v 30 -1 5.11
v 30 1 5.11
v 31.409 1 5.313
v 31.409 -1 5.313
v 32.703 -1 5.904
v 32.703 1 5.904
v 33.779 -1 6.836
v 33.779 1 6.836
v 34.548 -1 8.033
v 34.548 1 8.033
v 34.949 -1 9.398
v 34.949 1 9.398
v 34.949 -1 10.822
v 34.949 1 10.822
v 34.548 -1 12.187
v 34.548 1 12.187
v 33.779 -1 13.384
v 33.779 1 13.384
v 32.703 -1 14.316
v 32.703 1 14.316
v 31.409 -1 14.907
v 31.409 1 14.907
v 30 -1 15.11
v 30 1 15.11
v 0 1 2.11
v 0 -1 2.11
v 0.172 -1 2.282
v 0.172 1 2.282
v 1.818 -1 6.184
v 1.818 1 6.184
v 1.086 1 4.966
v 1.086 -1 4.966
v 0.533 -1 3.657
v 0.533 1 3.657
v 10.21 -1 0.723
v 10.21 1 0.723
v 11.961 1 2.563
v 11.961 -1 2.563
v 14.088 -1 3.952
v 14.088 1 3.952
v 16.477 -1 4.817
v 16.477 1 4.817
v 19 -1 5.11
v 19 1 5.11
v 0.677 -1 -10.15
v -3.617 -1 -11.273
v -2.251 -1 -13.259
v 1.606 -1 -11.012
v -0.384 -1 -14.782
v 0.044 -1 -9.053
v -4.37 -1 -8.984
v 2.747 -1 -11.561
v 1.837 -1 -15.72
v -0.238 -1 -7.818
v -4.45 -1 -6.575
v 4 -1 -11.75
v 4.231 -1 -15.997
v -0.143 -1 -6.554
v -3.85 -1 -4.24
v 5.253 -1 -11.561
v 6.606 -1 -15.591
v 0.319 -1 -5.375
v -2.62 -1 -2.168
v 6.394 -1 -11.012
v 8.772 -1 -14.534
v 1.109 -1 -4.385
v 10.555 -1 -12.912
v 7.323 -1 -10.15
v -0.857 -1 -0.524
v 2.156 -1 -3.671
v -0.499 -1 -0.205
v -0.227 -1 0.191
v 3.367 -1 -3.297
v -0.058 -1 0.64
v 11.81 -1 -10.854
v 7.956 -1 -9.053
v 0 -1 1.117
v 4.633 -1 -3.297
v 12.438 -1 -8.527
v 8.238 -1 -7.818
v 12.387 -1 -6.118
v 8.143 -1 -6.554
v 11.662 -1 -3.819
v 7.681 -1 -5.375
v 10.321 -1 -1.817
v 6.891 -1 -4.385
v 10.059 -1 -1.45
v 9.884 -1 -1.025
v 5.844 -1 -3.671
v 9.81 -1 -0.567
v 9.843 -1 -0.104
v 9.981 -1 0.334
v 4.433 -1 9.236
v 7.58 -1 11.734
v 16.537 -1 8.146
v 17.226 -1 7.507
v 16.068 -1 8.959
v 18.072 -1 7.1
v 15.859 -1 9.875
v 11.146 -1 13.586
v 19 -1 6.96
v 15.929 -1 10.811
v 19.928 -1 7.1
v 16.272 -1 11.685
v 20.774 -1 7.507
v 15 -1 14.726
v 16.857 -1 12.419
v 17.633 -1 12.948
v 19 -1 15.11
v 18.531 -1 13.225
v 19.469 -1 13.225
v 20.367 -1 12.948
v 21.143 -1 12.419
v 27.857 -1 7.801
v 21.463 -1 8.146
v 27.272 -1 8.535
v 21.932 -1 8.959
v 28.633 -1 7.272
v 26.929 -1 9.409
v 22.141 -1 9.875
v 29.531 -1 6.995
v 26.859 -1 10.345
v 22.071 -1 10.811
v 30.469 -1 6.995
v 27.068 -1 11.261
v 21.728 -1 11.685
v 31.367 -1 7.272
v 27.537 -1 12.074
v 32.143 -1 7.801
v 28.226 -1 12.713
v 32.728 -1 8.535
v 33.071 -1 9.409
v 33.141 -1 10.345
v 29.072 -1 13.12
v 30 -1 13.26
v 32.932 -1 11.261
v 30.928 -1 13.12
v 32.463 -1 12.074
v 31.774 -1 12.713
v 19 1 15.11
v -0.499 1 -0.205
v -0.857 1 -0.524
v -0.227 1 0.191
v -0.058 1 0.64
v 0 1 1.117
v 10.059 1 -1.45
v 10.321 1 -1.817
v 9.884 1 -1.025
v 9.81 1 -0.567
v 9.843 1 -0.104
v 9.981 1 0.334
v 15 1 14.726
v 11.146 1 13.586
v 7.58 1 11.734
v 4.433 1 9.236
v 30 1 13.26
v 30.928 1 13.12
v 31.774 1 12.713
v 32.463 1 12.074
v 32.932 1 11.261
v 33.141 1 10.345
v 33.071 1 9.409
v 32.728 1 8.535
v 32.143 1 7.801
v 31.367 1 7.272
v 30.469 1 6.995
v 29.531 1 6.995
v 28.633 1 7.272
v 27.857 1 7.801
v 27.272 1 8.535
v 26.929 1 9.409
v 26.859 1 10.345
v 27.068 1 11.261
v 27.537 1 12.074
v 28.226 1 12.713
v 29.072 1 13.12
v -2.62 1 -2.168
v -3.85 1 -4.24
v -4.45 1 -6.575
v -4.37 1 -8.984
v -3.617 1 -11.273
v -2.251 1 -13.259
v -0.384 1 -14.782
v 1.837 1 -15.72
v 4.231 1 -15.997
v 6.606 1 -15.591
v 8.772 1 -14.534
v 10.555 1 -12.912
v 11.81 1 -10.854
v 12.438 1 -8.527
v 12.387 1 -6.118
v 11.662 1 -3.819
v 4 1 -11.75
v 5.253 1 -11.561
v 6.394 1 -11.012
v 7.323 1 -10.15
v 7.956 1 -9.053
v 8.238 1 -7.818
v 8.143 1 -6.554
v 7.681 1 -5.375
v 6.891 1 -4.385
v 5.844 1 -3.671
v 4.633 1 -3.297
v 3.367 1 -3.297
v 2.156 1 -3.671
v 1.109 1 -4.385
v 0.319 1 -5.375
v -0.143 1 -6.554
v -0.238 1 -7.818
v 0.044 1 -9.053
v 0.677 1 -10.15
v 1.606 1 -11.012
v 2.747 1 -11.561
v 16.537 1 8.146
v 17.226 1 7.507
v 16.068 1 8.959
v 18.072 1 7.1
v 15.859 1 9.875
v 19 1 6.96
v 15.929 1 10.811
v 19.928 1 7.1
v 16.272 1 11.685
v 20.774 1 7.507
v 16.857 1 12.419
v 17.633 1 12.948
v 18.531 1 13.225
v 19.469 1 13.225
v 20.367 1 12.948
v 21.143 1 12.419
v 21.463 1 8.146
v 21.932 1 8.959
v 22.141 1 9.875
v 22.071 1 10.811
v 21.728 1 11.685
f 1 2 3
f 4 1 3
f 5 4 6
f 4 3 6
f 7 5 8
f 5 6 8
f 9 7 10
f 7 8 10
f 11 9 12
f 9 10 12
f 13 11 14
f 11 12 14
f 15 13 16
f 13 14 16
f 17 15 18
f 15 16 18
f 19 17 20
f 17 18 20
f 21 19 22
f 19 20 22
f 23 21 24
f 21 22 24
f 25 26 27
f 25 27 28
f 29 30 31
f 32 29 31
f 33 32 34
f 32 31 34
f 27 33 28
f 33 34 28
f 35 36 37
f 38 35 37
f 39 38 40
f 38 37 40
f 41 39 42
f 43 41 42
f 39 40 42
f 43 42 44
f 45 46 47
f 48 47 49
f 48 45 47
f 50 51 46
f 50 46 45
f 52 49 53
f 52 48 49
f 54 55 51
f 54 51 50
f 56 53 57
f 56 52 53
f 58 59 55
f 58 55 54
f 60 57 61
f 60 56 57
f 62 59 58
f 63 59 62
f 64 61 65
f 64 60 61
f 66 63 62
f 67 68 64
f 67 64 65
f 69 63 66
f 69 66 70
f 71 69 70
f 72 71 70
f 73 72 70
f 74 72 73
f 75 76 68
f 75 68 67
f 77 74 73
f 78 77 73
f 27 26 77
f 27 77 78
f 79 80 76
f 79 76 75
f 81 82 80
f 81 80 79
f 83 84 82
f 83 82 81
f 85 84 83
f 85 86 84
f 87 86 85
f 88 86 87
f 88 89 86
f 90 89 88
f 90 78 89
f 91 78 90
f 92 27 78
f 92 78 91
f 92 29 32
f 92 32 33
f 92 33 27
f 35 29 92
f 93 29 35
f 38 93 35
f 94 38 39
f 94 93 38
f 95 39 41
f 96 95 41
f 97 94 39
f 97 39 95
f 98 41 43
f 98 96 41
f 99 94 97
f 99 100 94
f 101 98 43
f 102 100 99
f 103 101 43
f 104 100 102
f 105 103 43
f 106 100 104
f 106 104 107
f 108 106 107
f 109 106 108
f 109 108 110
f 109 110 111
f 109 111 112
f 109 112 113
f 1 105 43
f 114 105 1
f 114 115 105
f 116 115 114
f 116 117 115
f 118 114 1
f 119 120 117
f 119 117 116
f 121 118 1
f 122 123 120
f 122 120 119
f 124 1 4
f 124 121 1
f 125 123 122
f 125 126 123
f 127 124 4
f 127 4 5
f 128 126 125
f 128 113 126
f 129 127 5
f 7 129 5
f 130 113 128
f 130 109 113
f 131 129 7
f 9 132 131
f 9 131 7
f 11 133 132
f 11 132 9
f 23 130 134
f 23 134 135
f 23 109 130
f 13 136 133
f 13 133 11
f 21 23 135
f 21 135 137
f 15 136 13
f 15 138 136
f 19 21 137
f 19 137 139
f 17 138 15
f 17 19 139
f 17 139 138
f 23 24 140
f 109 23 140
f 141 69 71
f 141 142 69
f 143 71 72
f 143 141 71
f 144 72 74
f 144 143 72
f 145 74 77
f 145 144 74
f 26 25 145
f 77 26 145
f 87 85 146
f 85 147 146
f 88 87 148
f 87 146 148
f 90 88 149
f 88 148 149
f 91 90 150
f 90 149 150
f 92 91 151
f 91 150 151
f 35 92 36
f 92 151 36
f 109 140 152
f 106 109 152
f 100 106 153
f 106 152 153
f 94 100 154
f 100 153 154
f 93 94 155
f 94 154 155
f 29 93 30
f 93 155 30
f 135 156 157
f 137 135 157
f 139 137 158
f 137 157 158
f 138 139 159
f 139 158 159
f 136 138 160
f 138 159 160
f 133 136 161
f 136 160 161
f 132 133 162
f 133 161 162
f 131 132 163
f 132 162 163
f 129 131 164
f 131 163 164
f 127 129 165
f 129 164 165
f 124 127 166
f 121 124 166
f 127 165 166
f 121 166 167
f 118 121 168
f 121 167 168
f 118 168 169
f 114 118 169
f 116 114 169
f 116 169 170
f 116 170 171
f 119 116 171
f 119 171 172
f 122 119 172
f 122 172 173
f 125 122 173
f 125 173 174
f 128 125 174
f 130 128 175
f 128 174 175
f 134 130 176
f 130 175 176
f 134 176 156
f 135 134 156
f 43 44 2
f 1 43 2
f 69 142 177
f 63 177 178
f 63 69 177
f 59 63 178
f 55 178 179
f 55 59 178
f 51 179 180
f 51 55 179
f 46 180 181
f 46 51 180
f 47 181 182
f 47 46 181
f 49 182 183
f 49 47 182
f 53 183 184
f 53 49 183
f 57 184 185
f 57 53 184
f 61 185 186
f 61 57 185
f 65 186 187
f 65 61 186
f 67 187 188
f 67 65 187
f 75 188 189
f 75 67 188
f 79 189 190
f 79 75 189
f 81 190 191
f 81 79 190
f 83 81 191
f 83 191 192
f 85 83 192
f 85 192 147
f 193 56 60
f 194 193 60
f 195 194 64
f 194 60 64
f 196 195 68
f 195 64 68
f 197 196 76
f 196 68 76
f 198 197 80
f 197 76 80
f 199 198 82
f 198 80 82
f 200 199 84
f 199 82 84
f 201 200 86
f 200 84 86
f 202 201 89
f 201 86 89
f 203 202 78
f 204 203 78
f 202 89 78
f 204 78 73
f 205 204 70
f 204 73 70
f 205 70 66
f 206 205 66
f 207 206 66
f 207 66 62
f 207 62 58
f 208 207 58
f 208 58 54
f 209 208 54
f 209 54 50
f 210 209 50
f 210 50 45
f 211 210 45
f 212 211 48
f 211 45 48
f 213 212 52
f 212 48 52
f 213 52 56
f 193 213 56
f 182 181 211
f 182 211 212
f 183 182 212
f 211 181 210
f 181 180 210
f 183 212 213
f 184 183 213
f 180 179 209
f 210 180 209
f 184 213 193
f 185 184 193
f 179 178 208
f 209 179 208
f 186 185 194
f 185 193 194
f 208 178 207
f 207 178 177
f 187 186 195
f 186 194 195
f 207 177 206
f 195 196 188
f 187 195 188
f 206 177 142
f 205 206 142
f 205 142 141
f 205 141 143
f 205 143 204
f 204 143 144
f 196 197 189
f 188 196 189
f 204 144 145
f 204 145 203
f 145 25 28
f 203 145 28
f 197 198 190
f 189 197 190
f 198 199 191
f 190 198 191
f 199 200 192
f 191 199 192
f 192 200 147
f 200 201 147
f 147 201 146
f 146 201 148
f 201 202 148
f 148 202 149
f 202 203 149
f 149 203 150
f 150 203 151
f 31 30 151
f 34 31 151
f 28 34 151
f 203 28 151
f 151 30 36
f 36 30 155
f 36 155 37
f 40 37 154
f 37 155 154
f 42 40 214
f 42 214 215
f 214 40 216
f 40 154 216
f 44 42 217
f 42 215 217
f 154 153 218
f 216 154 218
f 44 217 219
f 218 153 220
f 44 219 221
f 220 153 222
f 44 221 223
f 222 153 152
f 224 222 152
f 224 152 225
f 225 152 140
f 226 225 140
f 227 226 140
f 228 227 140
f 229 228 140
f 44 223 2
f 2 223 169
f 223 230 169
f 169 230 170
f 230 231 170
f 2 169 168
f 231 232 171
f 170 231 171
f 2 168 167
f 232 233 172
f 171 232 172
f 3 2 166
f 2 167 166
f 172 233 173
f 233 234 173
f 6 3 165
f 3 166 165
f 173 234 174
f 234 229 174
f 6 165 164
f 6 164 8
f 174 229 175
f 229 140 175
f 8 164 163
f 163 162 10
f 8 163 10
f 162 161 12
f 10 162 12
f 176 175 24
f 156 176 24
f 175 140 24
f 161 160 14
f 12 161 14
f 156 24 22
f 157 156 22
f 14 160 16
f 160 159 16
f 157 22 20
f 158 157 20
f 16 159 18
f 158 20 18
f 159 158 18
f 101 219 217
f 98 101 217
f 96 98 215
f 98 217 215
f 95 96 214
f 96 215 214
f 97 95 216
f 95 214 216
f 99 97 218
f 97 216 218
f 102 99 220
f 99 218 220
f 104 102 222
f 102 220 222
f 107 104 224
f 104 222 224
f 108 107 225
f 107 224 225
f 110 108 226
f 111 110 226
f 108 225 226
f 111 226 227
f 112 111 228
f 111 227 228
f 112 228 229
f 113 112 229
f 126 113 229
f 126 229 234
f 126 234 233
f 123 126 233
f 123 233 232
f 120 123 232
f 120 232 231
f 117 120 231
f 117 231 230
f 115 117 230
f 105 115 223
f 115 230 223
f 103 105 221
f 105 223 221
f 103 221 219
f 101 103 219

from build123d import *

# Parameters (mm, degrees)
SKETCH1_W           = 10.11
SKETCH1_H           = 2
EXTRUDE_THIN1_DEPTH = 8
CHAMFER1_SIZE       = 8
SKETCH2_R           = 3.15
BOSS_EXTRUDE1_DEPTH = 2
SKETCH6_R           = 8.5
SKETCH6_R_2         = 4.25
BOSS_EXTRUDE4_DEPTH = 2
FILLET4_R           = 2


with BuildPart() as part:
    # Sketch1 → Extrude-Thin1 (new body)
    with BuildSketch(Plane(origin=(0, 0, 0), x_dir=(0, 0, -1), z_dir=(1, 0, 0))):
        with Locations((-5.055, 0)):
            Rectangle(SKETCH1_W, SKETCH1_H)
    extrude(amount=EXTRUDE_THIN1_DEPTH)

    # Chamfer1
    chamfer1_edges = [part.edges().sort_by_distance(p)[0] for p in [
        (0, 0, 10.11),
    ]]
    chamfer(chamfer1_edges, length=CHAMFER1_SIZE - 0.0001)  # a hair under: the kernel refuses the full size

    # Sketch2 → Boss-Extrude1 (add)
    with BuildSketch(Plane(origin=(0, 1, 0), x_dir=(1, 0, 0), z_dir=(0, 1, 0))):
        with BuildLine():
            Line((0, -0.43455532), (0, 0))
            ThreePointArc((0, 0), (4.444005662, 0.947416312), (8.29515392, 3.358938877))
            ThreePointArc((8.29515392, 3.358938877), (12.175107047, -2.736751195), (19, -5.11))
            Line((19, -5.11), (30, -5.11))
            ThreePointArc((30, -5.11), (35, -10.11), (30, -15.11))
            Line((30, -15.11), (19, -15.11))
            ThreePointArc((19, -15.11), (9.319017932, -12.745412155), (1.818181818, -6.184151066))
            ThreePointArc((1.818181818, -6.184151066), (0.465374108, -3.449668766), (0, -0.43455532))
        make_face()
        with Locations(Location((30, -10.11, 0), (0, 0, 270))):
            Circle(SKETCH2_R, mode=Mode.SUBTRACT)
        with Locations(Location((19, -10.11, 0), (0, 0, 90))):
            Circle(SKETCH2_R, mode=Mode.SUBTRACT)
    extrude(amount=-BOSS_EXTRUDE1_DEPTH)

    # Sketch6 → Boss-Extrude4 (add)
    with BuildSketch(Plane.XZ.offset(1)):
        with Locations((4, -7.5)):
            Circle(SKETCH6_R)
        with Locations(Location((4, -7.5, 0), (0, 0, 270))):
            Circle(SKETCH6_R_2, mode=Mode.SUBTRACT)
    extrude(amount=-BOSS_EXTRUDE4_DEPTH)

    # Fillet4
    fillet4_edges = [part.edges().sort_by_distance(p)[0] for p in [
        (0, 0, 0),
        (9.243332379, 0, -0.809897941),
    ]]
    fillet(fillet4_edges, radius=FILLET4_R)


solid = part.part
